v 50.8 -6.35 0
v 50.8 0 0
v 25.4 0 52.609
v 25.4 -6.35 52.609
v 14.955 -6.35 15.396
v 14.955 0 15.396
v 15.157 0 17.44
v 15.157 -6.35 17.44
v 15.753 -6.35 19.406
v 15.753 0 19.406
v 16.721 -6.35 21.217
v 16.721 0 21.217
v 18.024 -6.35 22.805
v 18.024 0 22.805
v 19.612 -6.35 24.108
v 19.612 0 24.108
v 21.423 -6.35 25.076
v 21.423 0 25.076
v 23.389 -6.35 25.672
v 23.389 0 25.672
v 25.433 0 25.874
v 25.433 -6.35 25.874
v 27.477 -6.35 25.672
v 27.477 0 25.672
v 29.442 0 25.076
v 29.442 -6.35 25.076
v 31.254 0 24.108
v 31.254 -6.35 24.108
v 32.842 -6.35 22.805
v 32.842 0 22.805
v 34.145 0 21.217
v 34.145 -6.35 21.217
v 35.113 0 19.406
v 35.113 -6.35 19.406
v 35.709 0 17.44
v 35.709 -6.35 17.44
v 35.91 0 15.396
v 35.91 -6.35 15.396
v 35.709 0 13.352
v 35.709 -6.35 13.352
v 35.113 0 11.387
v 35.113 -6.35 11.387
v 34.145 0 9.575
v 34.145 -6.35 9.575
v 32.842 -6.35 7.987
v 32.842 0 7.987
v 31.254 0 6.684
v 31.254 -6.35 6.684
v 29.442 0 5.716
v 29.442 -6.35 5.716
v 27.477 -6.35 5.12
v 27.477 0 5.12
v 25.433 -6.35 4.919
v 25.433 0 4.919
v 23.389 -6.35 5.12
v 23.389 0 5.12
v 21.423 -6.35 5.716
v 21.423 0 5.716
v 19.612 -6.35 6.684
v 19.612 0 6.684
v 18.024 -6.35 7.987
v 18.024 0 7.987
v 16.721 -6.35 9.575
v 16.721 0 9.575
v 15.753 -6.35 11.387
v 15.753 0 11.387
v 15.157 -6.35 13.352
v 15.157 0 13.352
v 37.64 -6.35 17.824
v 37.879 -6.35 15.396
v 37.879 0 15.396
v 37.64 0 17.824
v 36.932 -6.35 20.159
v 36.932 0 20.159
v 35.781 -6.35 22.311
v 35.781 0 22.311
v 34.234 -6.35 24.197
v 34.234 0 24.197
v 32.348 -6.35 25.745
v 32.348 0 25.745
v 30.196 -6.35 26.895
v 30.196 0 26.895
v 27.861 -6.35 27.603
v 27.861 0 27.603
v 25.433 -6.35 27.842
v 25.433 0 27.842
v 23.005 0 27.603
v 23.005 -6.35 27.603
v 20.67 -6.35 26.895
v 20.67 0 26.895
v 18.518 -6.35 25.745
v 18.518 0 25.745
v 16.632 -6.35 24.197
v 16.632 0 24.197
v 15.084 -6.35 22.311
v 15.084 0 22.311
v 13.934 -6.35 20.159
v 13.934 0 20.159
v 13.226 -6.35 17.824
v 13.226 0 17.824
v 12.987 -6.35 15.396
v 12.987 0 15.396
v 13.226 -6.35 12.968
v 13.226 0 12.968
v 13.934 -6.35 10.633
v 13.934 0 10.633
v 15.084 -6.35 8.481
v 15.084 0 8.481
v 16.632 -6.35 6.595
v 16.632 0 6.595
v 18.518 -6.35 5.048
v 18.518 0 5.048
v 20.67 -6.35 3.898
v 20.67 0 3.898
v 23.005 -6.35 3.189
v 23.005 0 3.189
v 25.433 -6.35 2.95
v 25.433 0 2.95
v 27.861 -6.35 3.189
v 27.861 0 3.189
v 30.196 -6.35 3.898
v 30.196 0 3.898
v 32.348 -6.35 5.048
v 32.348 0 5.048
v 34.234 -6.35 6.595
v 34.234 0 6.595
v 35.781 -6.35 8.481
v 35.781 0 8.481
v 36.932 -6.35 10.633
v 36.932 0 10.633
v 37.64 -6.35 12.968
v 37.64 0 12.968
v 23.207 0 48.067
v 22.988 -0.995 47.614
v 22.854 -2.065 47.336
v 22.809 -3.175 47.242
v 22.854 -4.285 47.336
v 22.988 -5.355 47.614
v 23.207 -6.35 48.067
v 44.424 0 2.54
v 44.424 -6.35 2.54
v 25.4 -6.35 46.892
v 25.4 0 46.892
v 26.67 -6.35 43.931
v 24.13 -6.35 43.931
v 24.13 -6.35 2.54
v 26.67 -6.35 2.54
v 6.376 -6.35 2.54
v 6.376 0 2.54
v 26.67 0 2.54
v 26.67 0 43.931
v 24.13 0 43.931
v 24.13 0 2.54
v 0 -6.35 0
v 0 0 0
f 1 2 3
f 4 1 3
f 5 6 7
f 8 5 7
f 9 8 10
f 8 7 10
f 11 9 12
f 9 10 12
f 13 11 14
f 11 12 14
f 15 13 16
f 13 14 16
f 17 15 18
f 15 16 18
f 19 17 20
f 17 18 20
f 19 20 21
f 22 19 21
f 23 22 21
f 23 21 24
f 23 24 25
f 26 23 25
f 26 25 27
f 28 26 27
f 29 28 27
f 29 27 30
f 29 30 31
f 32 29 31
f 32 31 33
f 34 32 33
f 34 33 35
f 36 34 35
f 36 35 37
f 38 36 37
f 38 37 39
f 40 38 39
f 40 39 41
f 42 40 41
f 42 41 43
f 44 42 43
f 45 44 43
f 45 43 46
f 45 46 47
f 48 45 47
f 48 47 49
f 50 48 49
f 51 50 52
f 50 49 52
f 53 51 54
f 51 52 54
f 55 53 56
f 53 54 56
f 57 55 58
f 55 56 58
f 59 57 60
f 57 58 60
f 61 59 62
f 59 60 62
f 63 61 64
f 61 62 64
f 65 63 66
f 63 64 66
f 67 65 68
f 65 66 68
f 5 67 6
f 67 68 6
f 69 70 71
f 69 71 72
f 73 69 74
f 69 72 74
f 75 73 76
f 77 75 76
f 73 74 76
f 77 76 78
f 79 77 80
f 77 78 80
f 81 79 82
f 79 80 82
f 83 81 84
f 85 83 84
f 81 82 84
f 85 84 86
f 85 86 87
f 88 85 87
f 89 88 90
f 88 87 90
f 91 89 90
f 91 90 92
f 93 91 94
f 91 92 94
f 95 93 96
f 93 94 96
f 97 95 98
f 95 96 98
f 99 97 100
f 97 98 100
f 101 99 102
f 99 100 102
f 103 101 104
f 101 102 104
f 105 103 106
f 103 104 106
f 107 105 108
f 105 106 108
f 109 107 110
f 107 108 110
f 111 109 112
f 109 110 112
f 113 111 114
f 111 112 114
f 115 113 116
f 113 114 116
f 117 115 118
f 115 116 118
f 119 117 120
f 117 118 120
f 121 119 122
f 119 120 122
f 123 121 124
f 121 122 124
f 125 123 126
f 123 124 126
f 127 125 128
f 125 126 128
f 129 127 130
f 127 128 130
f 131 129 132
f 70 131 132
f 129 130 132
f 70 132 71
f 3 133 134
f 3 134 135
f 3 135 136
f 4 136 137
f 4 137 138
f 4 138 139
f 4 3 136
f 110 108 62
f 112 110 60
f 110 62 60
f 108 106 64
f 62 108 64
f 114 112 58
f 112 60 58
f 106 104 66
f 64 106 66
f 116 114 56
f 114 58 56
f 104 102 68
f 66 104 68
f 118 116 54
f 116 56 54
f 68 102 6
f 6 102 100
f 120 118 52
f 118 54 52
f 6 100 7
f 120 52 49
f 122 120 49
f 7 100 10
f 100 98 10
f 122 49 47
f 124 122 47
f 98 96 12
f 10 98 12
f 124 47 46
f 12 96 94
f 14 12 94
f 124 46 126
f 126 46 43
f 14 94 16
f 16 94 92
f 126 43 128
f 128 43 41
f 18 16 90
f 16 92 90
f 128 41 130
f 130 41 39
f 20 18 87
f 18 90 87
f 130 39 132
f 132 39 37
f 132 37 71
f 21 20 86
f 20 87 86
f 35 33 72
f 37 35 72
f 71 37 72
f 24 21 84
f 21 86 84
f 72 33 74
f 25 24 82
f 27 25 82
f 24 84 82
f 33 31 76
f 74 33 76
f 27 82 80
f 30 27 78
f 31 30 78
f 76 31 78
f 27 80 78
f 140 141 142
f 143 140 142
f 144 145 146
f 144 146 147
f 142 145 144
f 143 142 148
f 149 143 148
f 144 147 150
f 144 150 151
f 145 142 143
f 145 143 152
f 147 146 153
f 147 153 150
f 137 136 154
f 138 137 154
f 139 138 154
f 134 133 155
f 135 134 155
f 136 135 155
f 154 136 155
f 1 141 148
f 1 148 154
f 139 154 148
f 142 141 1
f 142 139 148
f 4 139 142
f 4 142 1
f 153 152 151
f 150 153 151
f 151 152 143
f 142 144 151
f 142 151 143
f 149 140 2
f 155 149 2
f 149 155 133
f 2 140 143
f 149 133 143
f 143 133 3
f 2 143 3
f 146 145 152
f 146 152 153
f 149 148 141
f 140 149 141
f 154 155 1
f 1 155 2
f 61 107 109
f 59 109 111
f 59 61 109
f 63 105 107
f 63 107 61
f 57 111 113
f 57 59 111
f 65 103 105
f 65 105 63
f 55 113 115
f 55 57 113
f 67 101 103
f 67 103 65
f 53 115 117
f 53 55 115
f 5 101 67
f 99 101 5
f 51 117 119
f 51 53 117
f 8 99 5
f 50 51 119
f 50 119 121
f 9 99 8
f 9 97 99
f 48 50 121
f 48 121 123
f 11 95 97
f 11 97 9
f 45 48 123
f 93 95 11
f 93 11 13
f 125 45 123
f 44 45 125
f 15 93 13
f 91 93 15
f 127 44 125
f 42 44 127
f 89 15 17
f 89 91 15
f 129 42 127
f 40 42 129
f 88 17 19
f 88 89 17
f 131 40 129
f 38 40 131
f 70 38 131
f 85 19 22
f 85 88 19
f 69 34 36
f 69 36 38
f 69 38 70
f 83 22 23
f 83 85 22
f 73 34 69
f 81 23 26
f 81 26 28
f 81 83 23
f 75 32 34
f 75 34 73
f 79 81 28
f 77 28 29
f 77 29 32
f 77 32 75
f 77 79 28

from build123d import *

# Parameters (mm, degrees)
F1_DEPTH  = 6.35
F3_DEPTH  = 25.4
F5_DEPTH  = 6.35
F6_R      = 12.446
F7_DEPTH  = 6.35
F9_D      = 20.955
F10_R     = 5.960066411
F11_DEPTH = 6.35
F12_DEPTH = 6.35


with BuildPart() as f1:
    # F0 (on Front) → F1 (new body)
    with BuildSketch(Plane.XZ):
        Polygon((25.4, 52.6092805501), (0, 0), (50.8, 0), align=None)
    extrude(amount=F1_DEPTH)

    # F2 (on face) → F3 (cut)
    with BuildSketch(Plane.XZ.offset(6.35)):
        Polygon((25.4, 46.8921025291), (6.3758416416, 2.54), (44.4241583584, 2.54), align=None)
    extrude(amount=-F3_DEPTH, mode=Mode.SUBTRACT)

    # F10 (on face) → F11 (join)
    with BuildSketch(Plane(origin=(0, 0, 0), x_dir=(0, -1, 0), z_dir=(-0.9005354425, 0, 0.4347826087))):
        with Locations((3.175, 58.42)):
            Circle(F10_R)
    extrude(amount=F11_DEPTH)

    # F12 (cut): a face of the model
    f12_faces = [f1.faces().sort_by_distance(p)[0] for p in [
        (19.6815999402, -3.175, 55.3701501153),
    ]]
    extrude(f12_faces, amount=-F12_DEPTH, mode=Mode.SUBTRACT)


with BuildPart() as f5:
    # F4 (on face) → F5 (new body)
    with BuildSketch(Plane.XZ.offset(6.35)):
        Polygon((25.4, 46.8921025291), (24.13, 43.9312792879), (24.13, 2.54), (26.67, 2.54), (26.67, 43.9312792879), align=None)
    extrude(amount=-F5_DEPTH)


with BuildPart() as f7:
    # F6 (on Front) → F7 (new body)
    with BuildSketch(Plane.XZ):
        with Locations((25.432904761, 15.3961197174)):
            Circle(F6_R)
    extrude(amount=F7_DEPTH)

    # F9 (through all)
    with Locations(Plane.XZ.offset(6.35)):
        with Locations((25.432904761, 15.3961197174)):
            Hole(F9_D / 2)


solid = Compound([f1.part, f5.part, f7.part])
